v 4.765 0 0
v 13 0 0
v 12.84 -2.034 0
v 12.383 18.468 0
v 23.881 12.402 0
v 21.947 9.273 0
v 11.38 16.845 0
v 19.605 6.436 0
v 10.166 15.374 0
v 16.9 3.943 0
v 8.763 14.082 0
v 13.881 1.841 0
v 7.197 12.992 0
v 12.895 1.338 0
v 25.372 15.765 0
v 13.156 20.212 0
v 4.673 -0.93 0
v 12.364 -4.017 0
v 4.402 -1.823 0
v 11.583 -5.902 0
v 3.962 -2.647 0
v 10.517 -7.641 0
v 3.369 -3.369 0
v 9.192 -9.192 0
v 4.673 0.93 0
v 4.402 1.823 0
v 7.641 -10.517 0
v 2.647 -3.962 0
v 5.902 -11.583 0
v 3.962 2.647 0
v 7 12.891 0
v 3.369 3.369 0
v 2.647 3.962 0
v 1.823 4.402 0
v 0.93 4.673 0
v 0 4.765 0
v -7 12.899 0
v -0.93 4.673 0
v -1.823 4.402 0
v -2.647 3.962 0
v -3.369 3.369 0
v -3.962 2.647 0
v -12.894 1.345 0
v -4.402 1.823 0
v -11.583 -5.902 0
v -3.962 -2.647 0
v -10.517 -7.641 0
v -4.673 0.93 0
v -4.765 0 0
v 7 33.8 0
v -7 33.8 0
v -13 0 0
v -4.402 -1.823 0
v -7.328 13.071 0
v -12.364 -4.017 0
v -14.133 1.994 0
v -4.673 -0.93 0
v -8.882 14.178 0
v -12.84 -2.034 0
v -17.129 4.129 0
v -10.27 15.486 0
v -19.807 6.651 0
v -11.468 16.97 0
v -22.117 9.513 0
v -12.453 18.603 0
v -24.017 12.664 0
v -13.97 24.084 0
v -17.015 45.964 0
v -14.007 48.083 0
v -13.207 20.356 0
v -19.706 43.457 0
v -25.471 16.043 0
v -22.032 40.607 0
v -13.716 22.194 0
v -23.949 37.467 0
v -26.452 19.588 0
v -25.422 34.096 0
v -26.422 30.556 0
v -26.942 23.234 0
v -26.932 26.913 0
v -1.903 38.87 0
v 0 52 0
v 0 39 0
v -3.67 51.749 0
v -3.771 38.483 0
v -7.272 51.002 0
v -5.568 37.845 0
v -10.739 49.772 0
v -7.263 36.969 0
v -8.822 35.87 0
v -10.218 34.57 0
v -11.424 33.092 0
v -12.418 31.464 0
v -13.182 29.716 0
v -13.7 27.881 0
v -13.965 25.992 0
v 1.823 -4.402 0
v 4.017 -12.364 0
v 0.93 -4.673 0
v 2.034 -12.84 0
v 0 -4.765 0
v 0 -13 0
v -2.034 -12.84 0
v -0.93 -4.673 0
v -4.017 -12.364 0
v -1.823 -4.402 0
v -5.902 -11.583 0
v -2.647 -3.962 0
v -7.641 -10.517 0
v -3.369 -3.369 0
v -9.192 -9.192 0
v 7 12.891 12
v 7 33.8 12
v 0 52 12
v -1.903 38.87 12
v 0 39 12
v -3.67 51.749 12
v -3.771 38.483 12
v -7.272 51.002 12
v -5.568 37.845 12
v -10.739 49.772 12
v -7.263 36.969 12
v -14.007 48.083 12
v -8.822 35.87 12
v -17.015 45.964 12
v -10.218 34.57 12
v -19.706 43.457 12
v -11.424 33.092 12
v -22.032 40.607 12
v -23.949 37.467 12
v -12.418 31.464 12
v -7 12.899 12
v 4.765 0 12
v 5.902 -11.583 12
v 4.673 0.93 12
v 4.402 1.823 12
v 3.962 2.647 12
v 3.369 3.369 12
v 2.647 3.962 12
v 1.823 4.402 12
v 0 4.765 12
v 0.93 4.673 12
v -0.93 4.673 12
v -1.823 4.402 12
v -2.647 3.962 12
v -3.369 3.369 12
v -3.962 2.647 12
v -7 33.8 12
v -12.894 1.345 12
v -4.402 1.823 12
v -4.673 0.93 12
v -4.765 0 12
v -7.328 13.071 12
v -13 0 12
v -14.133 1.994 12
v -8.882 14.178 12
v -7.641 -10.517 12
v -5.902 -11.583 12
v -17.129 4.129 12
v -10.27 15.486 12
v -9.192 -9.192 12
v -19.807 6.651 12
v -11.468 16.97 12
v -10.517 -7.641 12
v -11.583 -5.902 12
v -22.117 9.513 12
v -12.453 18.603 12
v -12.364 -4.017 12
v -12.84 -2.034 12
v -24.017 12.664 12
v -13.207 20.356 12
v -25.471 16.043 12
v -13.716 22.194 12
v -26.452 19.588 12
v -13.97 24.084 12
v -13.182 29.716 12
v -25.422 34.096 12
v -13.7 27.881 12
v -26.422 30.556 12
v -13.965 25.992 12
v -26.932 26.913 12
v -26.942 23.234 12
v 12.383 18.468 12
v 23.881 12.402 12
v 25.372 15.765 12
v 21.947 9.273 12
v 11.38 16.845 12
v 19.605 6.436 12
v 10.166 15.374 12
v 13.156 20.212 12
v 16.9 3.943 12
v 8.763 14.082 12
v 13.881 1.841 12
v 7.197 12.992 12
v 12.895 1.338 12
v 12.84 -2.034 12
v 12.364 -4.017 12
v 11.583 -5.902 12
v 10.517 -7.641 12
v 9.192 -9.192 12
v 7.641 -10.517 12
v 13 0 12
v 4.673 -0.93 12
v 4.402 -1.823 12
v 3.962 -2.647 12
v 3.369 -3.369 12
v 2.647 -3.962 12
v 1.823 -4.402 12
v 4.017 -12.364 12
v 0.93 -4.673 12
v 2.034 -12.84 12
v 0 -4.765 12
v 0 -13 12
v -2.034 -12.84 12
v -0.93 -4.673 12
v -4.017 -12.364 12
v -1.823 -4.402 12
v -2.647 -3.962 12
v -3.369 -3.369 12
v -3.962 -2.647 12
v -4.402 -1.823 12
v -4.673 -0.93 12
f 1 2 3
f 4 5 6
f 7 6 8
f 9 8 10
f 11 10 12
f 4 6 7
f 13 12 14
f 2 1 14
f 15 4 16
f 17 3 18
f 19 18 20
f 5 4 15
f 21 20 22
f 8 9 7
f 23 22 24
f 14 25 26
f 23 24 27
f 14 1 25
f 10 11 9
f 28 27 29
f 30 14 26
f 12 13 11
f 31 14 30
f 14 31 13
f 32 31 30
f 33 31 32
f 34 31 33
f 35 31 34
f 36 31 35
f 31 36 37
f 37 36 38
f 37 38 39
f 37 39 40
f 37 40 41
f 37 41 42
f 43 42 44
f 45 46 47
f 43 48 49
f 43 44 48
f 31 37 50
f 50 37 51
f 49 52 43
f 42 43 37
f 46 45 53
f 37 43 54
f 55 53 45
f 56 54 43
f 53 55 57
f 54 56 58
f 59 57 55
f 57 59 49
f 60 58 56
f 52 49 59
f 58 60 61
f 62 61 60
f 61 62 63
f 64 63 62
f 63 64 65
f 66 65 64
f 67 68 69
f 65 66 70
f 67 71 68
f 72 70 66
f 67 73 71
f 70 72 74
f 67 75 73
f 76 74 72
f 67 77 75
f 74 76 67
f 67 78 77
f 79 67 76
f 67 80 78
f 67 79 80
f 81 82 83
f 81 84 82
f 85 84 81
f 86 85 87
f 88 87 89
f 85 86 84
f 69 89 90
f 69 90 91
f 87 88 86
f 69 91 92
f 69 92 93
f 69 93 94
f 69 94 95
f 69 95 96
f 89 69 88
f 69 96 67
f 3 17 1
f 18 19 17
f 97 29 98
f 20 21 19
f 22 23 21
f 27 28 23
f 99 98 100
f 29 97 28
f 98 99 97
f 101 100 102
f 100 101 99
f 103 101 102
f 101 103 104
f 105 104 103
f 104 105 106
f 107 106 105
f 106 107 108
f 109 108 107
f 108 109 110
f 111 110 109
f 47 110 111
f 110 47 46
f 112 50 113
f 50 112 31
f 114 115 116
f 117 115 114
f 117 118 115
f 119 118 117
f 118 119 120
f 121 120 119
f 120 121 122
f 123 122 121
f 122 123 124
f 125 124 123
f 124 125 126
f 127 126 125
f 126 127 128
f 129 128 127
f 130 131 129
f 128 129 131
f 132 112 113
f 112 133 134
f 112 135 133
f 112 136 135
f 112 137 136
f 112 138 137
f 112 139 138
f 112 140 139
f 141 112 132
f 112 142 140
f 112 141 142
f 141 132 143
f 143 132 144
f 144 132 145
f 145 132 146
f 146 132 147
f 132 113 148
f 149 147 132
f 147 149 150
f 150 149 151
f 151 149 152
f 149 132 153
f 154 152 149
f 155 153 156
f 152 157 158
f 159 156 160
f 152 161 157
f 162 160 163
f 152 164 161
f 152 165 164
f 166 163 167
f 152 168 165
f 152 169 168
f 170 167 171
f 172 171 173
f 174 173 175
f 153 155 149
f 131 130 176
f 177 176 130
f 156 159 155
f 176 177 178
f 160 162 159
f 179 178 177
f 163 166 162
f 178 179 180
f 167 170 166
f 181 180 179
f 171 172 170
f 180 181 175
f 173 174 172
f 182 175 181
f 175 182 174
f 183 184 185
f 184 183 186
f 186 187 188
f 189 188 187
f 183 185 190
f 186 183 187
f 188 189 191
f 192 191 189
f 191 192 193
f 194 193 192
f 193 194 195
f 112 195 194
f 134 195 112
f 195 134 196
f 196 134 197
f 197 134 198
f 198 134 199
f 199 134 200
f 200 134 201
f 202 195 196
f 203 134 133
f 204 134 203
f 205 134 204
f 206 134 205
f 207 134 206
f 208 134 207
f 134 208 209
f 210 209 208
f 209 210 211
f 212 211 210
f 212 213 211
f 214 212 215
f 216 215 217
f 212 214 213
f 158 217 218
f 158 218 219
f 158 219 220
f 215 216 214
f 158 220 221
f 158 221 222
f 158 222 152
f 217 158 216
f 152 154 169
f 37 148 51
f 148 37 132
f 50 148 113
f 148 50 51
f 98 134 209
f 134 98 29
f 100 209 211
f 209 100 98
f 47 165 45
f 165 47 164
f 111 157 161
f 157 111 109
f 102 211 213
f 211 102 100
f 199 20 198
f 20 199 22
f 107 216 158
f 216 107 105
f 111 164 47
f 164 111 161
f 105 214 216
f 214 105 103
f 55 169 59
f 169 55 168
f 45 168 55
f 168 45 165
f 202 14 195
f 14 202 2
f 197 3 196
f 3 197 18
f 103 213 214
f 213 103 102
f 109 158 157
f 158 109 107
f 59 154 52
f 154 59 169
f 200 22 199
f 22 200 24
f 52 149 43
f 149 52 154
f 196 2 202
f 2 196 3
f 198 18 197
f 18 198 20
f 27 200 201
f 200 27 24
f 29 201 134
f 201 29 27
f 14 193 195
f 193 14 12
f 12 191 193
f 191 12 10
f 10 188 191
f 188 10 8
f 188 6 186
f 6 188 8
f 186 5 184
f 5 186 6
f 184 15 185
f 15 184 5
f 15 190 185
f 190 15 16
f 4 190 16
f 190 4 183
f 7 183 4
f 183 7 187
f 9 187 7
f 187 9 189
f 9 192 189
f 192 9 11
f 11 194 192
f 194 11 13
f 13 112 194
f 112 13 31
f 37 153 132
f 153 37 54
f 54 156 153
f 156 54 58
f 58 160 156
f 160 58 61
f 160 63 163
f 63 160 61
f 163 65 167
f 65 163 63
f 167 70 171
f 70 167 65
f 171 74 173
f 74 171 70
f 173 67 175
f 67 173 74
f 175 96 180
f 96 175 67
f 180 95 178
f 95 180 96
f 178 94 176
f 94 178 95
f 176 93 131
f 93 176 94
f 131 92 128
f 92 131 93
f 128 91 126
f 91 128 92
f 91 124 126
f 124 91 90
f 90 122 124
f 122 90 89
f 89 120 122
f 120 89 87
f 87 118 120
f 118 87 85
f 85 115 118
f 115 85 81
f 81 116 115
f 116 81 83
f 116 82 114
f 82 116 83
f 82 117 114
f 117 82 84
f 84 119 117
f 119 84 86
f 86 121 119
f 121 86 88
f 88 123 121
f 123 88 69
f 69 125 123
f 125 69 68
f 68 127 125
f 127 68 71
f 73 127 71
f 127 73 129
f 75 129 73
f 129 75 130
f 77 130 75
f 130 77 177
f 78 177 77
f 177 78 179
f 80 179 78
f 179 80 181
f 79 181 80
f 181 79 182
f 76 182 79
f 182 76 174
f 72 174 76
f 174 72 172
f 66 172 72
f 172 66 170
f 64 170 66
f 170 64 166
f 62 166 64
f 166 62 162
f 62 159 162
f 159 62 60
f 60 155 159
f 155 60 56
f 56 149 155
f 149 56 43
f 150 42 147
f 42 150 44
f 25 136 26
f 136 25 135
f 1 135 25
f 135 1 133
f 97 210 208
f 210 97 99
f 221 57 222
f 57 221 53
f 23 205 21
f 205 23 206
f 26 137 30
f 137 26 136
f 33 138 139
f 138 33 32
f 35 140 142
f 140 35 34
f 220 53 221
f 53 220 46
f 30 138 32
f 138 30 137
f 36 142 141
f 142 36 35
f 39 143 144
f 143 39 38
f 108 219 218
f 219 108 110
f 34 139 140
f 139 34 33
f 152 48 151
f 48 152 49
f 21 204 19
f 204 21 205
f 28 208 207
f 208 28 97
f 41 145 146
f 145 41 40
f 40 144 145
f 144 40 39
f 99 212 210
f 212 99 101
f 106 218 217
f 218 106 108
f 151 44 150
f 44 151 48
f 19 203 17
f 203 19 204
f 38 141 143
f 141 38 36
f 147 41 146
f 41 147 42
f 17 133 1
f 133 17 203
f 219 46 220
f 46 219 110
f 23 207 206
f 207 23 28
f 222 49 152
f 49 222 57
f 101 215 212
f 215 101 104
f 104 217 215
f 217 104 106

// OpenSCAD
$fn = 32;

// ----------------------------------------------------------------------
// Hook: 50 mm shank into a 14 mm curl, 12 mm thick
// ----------------------------------------------------------------------

// --- parameters (mm) ---
shank_len = 50;           // shank length from the boss centre
shank_w = 14;             // shank width
boss_d = 26;              // boss diameter
bore_d = 9.53;            // boss bore
curl_in = 14;             // curl inner radius
curl_out = 27;            // curl outer radius
curl_sweep = 250;         // curl sweep angle
hook_t = 12;              // hook thickness

shank_profile = [[-7, 33.8], [7, 33.8], [7, 11], [-7, 11]];
boss_profile = [[13, 0], [12.84, 2.034], [12.364, 4.017], [11.583, 5.902], [10.517, 7.641], [9.192, 9.192], [7.641, 10.517], [5.902, 11.583], [4.017, 12.364], [2.034, 12.84], [0, 13], [-2.034, 12.84], [-4.017, 12.364], [-5.902, 11.583], [-7.641, 10.517], [-9.192, 9.192], [-10.517, 7.641], [-11.583, 5.902], [-12.364, 4.017], [-12.84, 2.034], [-13, 0], [-12.84, -2.034], [-12.364, -4.017], [-11.583, -5.902], [-10.517, -7.641], [-9.192, -9.192], [-7.641, -10.517], [-5.902, -11.583], [-4.017, -12.364], [-2.034, -12.84], [0, -13], [2.034, -12.84], [4.017, -12.364], [5.902, -11.583], [7.641, -10.517], [9.192, -9.192], [10.517, -7.641], [11.583, -5.902], [12.364, -4.017], [12.84, -2.034]];
curl_profile = [[0, 52], [-3.67, 51.749], [-7.272, 51.002], [-10.739, 49.772], [-14.007, 48.083], [-17.015, 45.964], [-19.706, 43.457], [-22.032, 40.607], [-23.949, 37.467], [-25.422, 34.096], [-26.422, 30.556], [-26.932, 26.913], [-26.942, 23.234], [-26.452, 19.588], [-25.471, 16.043], [-24.017, 12.664], [-22.117, 9.513], [-19.807, 6.651], [-17.129, 4.129], [-14.133, 1.994], [-10.874, 0.287], [-7.414, -0.962], [-3.816, -1.729], [-0.147, -2], [3.524, -1.769], [7.13, -1.041], [10.604, 0.169], [13.881, 1.841], [16.9, 3.943], [19.605, 6.436], [21.947, 9.273], [23.881, 12.402], [25.372, 15.765], [13.156, 20.212], [12.383, 18.468], [11.38, 16.845], [10.166, 15.374], [8.763, 14.082], [7.197, 12.992], [5.498, 12.125], [3.697, 11.497], [1.827, 11.12], [-0.076, 11], [-1.979, 11.141], [-3.844, 11.538], [-5.638, 12.186], [-7.328, 13.071], [-8.882, 14.178], [-10.27, 15.486], [-11.468, 16.97], [-12.453, 18.603], [-13.207, 20.356], [-13.716, 22.194], [-13.97, 24.084], [-13.965, 25.992], [-13.7, 27.881], [-13.182, 29.716], [-12.418, 31.464], [-11.424, 33.092], [-10.218, 34.57], [-8.822, 35.87], [-7.263, 36.969], [-5.568, 37.845], [-3.771, 38.483], [-1.903, 38.87], [0, 39]];

difference() {
  union() {
    /* three overlapping outlines: shank, boss and the smooth curl */
    linear_extrude(height = hook_t) polygon(shank_profile);
    linear_extrude(height = hook_t) polygon(boss_profile);
    linear_extrude(height = hook_t) polygon(curl_profile);
  }
  translate([0, 0, -2.5]) cylinder(h = hook_t + 5, d = bore_d);
}
